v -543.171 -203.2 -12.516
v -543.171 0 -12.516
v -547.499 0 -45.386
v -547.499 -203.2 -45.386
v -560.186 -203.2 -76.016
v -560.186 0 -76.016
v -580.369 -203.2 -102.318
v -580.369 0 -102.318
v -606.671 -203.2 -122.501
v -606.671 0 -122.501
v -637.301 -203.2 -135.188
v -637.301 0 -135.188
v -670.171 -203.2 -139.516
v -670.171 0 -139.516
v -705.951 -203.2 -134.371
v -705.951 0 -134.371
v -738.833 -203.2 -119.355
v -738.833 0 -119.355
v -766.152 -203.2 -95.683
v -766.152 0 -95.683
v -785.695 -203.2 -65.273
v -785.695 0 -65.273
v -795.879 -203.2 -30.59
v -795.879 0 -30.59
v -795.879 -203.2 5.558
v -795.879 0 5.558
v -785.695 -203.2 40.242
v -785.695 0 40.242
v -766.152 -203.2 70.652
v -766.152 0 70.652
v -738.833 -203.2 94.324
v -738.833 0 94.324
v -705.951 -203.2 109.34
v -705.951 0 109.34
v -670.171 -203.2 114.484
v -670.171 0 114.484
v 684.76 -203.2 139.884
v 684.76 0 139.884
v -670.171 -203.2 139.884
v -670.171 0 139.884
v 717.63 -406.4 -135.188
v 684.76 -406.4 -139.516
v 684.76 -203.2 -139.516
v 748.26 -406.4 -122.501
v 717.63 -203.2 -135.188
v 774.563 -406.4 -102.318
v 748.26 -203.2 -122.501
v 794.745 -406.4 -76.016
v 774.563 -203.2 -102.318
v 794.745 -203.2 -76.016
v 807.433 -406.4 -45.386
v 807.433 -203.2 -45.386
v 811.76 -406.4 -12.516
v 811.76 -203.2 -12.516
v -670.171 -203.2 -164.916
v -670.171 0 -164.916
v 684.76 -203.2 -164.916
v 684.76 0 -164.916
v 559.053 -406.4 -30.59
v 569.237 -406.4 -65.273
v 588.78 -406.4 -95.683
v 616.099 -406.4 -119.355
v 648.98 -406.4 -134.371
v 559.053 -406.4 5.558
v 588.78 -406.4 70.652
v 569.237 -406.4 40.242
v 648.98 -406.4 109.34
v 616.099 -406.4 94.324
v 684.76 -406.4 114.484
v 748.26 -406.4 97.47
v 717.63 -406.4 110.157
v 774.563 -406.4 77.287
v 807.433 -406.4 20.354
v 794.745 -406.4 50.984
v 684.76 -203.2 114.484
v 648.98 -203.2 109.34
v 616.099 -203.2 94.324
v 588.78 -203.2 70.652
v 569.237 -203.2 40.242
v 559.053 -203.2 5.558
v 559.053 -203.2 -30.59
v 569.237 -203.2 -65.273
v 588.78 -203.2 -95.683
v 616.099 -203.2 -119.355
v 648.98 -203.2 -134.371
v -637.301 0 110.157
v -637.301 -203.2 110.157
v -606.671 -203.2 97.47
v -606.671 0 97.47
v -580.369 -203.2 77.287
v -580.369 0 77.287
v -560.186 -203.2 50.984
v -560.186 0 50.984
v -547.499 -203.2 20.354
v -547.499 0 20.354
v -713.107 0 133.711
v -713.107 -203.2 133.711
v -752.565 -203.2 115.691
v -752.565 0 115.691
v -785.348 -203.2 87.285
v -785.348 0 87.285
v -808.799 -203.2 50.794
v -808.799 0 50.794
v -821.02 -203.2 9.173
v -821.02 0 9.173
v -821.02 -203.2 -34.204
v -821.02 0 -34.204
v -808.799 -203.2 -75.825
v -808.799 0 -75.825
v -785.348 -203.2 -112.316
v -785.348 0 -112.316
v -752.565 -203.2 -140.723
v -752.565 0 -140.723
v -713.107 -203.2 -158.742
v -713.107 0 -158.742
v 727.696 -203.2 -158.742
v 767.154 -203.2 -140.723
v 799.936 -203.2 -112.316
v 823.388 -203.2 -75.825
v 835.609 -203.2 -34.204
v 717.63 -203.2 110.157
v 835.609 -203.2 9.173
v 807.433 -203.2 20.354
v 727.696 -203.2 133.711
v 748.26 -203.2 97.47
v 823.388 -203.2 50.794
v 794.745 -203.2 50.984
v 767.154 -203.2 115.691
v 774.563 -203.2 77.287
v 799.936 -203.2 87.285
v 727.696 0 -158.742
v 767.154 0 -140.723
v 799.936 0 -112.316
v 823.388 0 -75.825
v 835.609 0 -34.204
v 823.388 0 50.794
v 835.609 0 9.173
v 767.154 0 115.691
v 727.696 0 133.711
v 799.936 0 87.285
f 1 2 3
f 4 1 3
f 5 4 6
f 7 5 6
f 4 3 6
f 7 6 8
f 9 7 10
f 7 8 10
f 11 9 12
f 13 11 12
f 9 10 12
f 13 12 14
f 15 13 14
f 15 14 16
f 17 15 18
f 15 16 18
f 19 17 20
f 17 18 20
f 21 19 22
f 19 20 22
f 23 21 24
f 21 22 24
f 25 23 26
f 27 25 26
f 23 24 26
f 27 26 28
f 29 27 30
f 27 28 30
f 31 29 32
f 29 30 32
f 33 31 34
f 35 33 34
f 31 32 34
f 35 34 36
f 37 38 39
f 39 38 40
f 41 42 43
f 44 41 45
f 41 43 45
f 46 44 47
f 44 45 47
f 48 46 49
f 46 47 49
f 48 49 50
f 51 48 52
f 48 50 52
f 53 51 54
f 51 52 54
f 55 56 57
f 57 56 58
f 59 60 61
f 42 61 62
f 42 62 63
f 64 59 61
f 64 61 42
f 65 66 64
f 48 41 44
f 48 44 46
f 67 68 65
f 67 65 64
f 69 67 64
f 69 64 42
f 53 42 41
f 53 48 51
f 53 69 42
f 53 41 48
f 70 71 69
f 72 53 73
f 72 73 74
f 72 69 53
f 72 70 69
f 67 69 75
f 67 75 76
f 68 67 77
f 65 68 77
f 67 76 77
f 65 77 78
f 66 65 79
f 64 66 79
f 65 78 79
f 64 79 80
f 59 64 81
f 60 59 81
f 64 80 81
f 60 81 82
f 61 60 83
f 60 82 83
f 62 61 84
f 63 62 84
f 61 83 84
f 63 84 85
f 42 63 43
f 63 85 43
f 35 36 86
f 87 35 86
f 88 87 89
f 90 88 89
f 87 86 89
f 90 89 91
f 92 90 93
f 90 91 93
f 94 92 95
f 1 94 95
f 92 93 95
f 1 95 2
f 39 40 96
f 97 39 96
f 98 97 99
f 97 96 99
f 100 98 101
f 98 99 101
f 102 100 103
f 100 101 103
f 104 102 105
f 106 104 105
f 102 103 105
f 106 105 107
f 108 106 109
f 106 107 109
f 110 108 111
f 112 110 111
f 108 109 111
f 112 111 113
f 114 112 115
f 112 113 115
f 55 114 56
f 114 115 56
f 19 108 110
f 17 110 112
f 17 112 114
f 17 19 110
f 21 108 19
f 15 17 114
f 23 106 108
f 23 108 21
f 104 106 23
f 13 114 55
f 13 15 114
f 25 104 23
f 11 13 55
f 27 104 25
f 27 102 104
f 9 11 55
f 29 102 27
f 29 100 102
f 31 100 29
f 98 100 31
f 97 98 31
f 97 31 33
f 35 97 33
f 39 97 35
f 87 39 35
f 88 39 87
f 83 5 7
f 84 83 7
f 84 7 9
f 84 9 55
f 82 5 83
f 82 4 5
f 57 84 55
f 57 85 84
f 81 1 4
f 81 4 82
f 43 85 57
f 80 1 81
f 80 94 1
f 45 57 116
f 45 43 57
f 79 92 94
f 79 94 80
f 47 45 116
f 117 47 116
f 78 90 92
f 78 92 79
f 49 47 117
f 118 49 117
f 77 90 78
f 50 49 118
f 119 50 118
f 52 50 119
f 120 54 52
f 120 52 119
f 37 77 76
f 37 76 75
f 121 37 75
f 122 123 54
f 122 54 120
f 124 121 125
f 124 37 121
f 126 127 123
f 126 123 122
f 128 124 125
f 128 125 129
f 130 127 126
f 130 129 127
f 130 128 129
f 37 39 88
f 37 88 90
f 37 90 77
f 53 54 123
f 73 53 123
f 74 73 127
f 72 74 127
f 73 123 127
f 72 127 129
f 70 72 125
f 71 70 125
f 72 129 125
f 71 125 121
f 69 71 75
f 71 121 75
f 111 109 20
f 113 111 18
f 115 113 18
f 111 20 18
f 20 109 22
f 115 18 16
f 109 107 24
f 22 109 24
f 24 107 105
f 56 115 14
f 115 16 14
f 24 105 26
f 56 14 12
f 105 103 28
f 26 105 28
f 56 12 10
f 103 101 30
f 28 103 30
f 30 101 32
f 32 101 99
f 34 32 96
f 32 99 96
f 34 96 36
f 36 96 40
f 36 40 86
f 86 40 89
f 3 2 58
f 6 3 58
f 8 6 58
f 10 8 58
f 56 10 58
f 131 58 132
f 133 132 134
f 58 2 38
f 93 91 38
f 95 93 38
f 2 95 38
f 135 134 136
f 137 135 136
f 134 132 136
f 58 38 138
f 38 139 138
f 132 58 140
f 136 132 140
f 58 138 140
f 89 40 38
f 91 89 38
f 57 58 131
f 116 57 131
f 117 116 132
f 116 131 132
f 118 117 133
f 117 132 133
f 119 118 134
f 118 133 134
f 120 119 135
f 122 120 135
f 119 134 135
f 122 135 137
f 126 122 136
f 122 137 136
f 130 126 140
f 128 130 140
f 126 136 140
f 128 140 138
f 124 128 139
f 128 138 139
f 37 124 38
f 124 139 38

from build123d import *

# Parameters (mm, degrees)
F1_DEPTH = 203.2
F2_DEPTH = 406.4


with BuildPart() as f1:
    # F0 (on Front) → F1 (new body)
    with BuildSketch(Plane.XZ):
        with BuildLine():
            Line((-670.171326, 139.884379), (-670.171326, 114.484379))
            ThreePointArc((-670.171326, 114.484379), (-580.368765, 77.28694), (-543.171326, -12.515621))
            ThreePointArc((-543.171326, -12.515621), (-580.368765, -102.318182), (-670.171326, -139.515621))
            Line((-670.171326, -139.515621), (-670.171326, -164.915621))
            Line((-670.171326, -164.915621), (684.760069, -164.915621))
            Line((684.760069, -164.915621), (684.760069, -139.515621))
            ThreePointArc((684.760069, -139.515621), (557.760069, -12.515621), (684.760069, 114.484379))
            Line((684.760069, 114.484379), (684.760069, 139.884379))
            Line((684.760069, 139.884379), (-670.171326, 139.884379))
        make_face()
        with BuildLine():
            ThreePointArc((-670.171326, -139.515621), (-797.171326, -12.515621), (-670.171326, 114.484379))
            Line((-670.171326, 114.484379), (-670.171326, 139.884379))
            ThreePointArc((-670.171326, 139.884379), (-822.571326, -12.515621), (-670.171326, -164.915621))
            Line((-670.171326, -164.915621), (-670.171326, -139.515621))
        make_face()
        with BuildLine():
            ThreePointArc((684.760069, -164.915621), (837.160069, -12.515621), (684.760069, 139.884379))
            Line((684.760069, 139.884379), (684.760069, 114.484379))
            ThreePointArc((684.760069, 114.484379), (774.562631, 77.28694), (811.760069, -12.515621))
            ThreePointArc((811.760069, -12.515621), (774.562631, -102.318182), (684.760069, -139.515621))
            Line((684.760069, -139.515621), (684.760069, -164.915621))
        make_face()
    extrude(amount=F1_DEPTH)

    # F0 (on Front) → F2 (join)
    with BuildSketch(Plane.XZ):
        with BuildLine():
            ThreePointArc((811.760069, -12.515621), (774.562631, 77.28694), (684.760069, 114.484379))
            Line((684.760069, 114.484379), (684.760069, -139.515621))
            ThreePointArc((684.760069, -139.515621), (774.562631, -102.318182), (811.760069, -12.515621))
        make_face()
        with BuildLine():
            Line((684.760069, -139.515621), (684.760069, 114.484379))
            ThreePointArc((684.760069, 114.484379), (557.760069, -12.515621), (684.760069, -139.515621))
        make_face()
    extrude(amount=F2_DEPTH)


solid = f1.part
